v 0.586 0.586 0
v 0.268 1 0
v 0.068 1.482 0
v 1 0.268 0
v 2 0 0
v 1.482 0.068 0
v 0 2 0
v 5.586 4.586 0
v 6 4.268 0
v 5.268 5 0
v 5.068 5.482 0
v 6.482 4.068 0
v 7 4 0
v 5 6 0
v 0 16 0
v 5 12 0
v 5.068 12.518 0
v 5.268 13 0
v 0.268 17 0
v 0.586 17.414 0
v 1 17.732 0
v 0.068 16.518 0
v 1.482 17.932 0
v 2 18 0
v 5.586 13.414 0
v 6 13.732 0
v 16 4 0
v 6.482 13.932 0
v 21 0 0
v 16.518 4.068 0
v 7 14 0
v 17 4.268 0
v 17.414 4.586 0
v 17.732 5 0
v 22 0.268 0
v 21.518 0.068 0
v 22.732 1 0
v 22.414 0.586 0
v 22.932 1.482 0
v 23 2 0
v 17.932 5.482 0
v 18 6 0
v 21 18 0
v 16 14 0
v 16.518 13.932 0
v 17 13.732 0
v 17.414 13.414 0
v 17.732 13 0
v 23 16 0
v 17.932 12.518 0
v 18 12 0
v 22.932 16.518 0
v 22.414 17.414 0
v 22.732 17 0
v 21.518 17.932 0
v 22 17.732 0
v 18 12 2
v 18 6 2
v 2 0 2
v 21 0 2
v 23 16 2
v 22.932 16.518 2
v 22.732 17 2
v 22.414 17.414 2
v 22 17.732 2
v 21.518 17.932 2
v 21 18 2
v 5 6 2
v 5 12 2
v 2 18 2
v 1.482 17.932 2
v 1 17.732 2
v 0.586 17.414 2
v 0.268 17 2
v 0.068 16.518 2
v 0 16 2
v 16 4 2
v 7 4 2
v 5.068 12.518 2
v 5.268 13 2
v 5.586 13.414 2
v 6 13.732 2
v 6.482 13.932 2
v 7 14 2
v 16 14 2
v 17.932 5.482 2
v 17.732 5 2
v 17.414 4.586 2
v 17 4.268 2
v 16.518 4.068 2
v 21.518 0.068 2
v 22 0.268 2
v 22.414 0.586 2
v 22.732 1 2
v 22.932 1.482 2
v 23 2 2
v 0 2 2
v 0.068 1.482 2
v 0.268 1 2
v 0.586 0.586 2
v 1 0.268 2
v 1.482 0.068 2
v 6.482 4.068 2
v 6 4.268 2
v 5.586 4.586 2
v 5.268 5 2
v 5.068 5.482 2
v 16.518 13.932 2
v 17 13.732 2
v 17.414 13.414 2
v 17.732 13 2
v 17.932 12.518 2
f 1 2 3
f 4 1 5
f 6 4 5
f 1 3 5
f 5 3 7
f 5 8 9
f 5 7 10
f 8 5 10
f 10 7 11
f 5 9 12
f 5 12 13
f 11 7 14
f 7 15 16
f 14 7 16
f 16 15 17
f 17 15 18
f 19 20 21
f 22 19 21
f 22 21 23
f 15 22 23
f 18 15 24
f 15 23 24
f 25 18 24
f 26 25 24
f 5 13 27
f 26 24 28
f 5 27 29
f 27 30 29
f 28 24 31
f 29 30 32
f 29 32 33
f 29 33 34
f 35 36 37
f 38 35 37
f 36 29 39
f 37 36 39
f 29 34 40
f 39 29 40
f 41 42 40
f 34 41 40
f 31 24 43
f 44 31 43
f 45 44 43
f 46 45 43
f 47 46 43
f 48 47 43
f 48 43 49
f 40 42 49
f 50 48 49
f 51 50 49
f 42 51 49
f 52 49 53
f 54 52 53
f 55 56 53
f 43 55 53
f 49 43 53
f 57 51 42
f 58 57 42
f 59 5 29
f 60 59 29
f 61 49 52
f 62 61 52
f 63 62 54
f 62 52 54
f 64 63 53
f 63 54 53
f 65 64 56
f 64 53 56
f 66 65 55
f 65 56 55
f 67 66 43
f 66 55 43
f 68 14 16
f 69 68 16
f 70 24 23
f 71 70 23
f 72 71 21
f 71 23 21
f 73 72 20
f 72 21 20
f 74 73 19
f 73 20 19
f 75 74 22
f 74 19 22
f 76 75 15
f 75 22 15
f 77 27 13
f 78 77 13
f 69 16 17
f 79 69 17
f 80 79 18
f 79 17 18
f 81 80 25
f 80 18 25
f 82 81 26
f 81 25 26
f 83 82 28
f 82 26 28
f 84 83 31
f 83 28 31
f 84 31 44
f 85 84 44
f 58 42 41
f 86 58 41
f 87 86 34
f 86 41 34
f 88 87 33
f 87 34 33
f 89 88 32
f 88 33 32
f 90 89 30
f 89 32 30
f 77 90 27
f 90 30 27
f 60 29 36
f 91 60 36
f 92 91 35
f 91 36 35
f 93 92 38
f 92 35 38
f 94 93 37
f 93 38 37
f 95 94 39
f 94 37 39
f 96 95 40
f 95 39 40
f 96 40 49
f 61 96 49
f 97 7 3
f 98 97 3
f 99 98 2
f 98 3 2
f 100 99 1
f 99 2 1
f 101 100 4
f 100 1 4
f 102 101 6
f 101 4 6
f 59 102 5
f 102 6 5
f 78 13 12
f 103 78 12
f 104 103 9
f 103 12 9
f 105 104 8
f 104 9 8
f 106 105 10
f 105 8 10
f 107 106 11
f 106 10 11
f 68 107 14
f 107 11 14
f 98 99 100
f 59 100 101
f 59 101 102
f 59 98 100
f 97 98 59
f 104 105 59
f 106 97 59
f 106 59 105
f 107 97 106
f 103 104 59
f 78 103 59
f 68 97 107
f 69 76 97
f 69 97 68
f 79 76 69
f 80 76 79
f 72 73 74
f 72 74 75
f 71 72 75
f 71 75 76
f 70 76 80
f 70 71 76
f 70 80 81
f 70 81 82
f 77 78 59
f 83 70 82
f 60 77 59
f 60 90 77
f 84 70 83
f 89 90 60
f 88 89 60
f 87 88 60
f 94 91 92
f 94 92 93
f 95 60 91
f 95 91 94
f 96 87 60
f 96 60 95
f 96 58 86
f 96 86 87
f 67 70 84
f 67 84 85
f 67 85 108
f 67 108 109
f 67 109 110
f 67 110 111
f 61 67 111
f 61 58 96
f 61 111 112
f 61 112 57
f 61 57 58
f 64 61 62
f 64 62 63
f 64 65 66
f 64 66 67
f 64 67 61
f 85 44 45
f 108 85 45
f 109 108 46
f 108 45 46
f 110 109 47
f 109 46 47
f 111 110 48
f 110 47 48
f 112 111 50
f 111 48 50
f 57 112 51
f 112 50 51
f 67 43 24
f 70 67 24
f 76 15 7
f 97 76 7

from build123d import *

# Parameters (mm, degrees)
F1_DEPTH = 2


with BuildPart() as f1:
    # F0 (on Top) → F1 (new body)
    with BuildSketch(Plane.XY):
        with BuildLine():
            ThreePointArc((0, 2), (0.585786, 0.585786), (2, 0))
            Line((2, 0), (21, 0))
            ThreePointArc((21, 0), (22.414214, 0.585786), (23, 2))
            Line((23, 2), (23, 16))
            ThreePointArc((23, 16), (22.414214, 17.414214), (21, 18))
            Line((21, 18), (2, 18))
            ThreePointArc((2, 18), (0.585786, 17.414214), (0, 16))
            Line((0, 16), (0, 2))
        make_face()
        with BuildLine():
            Line((5, 6), (5, 9))
            Line((5, 9), (5, 12))
            ThreePointArc((5, 12), (5.585786, 13.414214), (7, 14))
            Line((7, 14), (16, 14))
            ThreePointArc((16, 14), (17.414214, 13.414214), (18, 12))
            Line((18, 12), (18, 9))
            Line((18, 9), (18, 6))
            ThreePointArc((18, 6), (17.414214, 4.585786), (16, 4))
            Line((16, 4), (7, 4))
            ThreePointArc((7, 4), (5.585786, 4.585786), (5, 6))
        make_face(mode=Mode.SUBTRACT)
    extrude(amount=F1_DEPTH)


solid = f1.part
